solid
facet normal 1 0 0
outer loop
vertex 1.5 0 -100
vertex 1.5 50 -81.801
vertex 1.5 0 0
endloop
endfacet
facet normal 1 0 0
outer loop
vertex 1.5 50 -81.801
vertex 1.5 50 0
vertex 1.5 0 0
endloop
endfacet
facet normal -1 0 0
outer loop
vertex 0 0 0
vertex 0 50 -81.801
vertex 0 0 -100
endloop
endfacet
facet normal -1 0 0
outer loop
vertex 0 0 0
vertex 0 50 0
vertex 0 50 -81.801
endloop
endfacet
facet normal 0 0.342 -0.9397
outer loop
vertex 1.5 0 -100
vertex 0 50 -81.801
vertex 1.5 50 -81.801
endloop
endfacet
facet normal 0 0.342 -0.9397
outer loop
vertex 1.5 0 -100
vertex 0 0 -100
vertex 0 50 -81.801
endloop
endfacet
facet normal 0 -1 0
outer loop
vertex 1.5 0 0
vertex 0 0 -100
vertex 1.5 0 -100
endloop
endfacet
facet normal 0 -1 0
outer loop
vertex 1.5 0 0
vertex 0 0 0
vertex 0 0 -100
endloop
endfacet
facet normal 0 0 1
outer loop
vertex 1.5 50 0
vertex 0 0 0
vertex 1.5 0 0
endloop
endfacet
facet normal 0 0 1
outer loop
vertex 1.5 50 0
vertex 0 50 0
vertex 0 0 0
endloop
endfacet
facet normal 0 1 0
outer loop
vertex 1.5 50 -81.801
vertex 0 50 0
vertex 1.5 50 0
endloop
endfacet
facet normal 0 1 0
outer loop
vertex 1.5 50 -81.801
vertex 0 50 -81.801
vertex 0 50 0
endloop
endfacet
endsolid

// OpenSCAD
module playwood(width=50, height=100, playwood_thickness = 1.5, roof_angle=20) 
{
    cut_depth = width*tan(roof_angle);
    
    color([0.9,0.9,0.9,0.6])
    translate([playwood_thickness,0,0])
    rotate([90,180,270])
    linear_extrude(playwood_thickness) 
    polygon(points=[[0, 0], [width,0], [width,height-cut_depth], [0, height], [0, 0]]);
}

playwood();
